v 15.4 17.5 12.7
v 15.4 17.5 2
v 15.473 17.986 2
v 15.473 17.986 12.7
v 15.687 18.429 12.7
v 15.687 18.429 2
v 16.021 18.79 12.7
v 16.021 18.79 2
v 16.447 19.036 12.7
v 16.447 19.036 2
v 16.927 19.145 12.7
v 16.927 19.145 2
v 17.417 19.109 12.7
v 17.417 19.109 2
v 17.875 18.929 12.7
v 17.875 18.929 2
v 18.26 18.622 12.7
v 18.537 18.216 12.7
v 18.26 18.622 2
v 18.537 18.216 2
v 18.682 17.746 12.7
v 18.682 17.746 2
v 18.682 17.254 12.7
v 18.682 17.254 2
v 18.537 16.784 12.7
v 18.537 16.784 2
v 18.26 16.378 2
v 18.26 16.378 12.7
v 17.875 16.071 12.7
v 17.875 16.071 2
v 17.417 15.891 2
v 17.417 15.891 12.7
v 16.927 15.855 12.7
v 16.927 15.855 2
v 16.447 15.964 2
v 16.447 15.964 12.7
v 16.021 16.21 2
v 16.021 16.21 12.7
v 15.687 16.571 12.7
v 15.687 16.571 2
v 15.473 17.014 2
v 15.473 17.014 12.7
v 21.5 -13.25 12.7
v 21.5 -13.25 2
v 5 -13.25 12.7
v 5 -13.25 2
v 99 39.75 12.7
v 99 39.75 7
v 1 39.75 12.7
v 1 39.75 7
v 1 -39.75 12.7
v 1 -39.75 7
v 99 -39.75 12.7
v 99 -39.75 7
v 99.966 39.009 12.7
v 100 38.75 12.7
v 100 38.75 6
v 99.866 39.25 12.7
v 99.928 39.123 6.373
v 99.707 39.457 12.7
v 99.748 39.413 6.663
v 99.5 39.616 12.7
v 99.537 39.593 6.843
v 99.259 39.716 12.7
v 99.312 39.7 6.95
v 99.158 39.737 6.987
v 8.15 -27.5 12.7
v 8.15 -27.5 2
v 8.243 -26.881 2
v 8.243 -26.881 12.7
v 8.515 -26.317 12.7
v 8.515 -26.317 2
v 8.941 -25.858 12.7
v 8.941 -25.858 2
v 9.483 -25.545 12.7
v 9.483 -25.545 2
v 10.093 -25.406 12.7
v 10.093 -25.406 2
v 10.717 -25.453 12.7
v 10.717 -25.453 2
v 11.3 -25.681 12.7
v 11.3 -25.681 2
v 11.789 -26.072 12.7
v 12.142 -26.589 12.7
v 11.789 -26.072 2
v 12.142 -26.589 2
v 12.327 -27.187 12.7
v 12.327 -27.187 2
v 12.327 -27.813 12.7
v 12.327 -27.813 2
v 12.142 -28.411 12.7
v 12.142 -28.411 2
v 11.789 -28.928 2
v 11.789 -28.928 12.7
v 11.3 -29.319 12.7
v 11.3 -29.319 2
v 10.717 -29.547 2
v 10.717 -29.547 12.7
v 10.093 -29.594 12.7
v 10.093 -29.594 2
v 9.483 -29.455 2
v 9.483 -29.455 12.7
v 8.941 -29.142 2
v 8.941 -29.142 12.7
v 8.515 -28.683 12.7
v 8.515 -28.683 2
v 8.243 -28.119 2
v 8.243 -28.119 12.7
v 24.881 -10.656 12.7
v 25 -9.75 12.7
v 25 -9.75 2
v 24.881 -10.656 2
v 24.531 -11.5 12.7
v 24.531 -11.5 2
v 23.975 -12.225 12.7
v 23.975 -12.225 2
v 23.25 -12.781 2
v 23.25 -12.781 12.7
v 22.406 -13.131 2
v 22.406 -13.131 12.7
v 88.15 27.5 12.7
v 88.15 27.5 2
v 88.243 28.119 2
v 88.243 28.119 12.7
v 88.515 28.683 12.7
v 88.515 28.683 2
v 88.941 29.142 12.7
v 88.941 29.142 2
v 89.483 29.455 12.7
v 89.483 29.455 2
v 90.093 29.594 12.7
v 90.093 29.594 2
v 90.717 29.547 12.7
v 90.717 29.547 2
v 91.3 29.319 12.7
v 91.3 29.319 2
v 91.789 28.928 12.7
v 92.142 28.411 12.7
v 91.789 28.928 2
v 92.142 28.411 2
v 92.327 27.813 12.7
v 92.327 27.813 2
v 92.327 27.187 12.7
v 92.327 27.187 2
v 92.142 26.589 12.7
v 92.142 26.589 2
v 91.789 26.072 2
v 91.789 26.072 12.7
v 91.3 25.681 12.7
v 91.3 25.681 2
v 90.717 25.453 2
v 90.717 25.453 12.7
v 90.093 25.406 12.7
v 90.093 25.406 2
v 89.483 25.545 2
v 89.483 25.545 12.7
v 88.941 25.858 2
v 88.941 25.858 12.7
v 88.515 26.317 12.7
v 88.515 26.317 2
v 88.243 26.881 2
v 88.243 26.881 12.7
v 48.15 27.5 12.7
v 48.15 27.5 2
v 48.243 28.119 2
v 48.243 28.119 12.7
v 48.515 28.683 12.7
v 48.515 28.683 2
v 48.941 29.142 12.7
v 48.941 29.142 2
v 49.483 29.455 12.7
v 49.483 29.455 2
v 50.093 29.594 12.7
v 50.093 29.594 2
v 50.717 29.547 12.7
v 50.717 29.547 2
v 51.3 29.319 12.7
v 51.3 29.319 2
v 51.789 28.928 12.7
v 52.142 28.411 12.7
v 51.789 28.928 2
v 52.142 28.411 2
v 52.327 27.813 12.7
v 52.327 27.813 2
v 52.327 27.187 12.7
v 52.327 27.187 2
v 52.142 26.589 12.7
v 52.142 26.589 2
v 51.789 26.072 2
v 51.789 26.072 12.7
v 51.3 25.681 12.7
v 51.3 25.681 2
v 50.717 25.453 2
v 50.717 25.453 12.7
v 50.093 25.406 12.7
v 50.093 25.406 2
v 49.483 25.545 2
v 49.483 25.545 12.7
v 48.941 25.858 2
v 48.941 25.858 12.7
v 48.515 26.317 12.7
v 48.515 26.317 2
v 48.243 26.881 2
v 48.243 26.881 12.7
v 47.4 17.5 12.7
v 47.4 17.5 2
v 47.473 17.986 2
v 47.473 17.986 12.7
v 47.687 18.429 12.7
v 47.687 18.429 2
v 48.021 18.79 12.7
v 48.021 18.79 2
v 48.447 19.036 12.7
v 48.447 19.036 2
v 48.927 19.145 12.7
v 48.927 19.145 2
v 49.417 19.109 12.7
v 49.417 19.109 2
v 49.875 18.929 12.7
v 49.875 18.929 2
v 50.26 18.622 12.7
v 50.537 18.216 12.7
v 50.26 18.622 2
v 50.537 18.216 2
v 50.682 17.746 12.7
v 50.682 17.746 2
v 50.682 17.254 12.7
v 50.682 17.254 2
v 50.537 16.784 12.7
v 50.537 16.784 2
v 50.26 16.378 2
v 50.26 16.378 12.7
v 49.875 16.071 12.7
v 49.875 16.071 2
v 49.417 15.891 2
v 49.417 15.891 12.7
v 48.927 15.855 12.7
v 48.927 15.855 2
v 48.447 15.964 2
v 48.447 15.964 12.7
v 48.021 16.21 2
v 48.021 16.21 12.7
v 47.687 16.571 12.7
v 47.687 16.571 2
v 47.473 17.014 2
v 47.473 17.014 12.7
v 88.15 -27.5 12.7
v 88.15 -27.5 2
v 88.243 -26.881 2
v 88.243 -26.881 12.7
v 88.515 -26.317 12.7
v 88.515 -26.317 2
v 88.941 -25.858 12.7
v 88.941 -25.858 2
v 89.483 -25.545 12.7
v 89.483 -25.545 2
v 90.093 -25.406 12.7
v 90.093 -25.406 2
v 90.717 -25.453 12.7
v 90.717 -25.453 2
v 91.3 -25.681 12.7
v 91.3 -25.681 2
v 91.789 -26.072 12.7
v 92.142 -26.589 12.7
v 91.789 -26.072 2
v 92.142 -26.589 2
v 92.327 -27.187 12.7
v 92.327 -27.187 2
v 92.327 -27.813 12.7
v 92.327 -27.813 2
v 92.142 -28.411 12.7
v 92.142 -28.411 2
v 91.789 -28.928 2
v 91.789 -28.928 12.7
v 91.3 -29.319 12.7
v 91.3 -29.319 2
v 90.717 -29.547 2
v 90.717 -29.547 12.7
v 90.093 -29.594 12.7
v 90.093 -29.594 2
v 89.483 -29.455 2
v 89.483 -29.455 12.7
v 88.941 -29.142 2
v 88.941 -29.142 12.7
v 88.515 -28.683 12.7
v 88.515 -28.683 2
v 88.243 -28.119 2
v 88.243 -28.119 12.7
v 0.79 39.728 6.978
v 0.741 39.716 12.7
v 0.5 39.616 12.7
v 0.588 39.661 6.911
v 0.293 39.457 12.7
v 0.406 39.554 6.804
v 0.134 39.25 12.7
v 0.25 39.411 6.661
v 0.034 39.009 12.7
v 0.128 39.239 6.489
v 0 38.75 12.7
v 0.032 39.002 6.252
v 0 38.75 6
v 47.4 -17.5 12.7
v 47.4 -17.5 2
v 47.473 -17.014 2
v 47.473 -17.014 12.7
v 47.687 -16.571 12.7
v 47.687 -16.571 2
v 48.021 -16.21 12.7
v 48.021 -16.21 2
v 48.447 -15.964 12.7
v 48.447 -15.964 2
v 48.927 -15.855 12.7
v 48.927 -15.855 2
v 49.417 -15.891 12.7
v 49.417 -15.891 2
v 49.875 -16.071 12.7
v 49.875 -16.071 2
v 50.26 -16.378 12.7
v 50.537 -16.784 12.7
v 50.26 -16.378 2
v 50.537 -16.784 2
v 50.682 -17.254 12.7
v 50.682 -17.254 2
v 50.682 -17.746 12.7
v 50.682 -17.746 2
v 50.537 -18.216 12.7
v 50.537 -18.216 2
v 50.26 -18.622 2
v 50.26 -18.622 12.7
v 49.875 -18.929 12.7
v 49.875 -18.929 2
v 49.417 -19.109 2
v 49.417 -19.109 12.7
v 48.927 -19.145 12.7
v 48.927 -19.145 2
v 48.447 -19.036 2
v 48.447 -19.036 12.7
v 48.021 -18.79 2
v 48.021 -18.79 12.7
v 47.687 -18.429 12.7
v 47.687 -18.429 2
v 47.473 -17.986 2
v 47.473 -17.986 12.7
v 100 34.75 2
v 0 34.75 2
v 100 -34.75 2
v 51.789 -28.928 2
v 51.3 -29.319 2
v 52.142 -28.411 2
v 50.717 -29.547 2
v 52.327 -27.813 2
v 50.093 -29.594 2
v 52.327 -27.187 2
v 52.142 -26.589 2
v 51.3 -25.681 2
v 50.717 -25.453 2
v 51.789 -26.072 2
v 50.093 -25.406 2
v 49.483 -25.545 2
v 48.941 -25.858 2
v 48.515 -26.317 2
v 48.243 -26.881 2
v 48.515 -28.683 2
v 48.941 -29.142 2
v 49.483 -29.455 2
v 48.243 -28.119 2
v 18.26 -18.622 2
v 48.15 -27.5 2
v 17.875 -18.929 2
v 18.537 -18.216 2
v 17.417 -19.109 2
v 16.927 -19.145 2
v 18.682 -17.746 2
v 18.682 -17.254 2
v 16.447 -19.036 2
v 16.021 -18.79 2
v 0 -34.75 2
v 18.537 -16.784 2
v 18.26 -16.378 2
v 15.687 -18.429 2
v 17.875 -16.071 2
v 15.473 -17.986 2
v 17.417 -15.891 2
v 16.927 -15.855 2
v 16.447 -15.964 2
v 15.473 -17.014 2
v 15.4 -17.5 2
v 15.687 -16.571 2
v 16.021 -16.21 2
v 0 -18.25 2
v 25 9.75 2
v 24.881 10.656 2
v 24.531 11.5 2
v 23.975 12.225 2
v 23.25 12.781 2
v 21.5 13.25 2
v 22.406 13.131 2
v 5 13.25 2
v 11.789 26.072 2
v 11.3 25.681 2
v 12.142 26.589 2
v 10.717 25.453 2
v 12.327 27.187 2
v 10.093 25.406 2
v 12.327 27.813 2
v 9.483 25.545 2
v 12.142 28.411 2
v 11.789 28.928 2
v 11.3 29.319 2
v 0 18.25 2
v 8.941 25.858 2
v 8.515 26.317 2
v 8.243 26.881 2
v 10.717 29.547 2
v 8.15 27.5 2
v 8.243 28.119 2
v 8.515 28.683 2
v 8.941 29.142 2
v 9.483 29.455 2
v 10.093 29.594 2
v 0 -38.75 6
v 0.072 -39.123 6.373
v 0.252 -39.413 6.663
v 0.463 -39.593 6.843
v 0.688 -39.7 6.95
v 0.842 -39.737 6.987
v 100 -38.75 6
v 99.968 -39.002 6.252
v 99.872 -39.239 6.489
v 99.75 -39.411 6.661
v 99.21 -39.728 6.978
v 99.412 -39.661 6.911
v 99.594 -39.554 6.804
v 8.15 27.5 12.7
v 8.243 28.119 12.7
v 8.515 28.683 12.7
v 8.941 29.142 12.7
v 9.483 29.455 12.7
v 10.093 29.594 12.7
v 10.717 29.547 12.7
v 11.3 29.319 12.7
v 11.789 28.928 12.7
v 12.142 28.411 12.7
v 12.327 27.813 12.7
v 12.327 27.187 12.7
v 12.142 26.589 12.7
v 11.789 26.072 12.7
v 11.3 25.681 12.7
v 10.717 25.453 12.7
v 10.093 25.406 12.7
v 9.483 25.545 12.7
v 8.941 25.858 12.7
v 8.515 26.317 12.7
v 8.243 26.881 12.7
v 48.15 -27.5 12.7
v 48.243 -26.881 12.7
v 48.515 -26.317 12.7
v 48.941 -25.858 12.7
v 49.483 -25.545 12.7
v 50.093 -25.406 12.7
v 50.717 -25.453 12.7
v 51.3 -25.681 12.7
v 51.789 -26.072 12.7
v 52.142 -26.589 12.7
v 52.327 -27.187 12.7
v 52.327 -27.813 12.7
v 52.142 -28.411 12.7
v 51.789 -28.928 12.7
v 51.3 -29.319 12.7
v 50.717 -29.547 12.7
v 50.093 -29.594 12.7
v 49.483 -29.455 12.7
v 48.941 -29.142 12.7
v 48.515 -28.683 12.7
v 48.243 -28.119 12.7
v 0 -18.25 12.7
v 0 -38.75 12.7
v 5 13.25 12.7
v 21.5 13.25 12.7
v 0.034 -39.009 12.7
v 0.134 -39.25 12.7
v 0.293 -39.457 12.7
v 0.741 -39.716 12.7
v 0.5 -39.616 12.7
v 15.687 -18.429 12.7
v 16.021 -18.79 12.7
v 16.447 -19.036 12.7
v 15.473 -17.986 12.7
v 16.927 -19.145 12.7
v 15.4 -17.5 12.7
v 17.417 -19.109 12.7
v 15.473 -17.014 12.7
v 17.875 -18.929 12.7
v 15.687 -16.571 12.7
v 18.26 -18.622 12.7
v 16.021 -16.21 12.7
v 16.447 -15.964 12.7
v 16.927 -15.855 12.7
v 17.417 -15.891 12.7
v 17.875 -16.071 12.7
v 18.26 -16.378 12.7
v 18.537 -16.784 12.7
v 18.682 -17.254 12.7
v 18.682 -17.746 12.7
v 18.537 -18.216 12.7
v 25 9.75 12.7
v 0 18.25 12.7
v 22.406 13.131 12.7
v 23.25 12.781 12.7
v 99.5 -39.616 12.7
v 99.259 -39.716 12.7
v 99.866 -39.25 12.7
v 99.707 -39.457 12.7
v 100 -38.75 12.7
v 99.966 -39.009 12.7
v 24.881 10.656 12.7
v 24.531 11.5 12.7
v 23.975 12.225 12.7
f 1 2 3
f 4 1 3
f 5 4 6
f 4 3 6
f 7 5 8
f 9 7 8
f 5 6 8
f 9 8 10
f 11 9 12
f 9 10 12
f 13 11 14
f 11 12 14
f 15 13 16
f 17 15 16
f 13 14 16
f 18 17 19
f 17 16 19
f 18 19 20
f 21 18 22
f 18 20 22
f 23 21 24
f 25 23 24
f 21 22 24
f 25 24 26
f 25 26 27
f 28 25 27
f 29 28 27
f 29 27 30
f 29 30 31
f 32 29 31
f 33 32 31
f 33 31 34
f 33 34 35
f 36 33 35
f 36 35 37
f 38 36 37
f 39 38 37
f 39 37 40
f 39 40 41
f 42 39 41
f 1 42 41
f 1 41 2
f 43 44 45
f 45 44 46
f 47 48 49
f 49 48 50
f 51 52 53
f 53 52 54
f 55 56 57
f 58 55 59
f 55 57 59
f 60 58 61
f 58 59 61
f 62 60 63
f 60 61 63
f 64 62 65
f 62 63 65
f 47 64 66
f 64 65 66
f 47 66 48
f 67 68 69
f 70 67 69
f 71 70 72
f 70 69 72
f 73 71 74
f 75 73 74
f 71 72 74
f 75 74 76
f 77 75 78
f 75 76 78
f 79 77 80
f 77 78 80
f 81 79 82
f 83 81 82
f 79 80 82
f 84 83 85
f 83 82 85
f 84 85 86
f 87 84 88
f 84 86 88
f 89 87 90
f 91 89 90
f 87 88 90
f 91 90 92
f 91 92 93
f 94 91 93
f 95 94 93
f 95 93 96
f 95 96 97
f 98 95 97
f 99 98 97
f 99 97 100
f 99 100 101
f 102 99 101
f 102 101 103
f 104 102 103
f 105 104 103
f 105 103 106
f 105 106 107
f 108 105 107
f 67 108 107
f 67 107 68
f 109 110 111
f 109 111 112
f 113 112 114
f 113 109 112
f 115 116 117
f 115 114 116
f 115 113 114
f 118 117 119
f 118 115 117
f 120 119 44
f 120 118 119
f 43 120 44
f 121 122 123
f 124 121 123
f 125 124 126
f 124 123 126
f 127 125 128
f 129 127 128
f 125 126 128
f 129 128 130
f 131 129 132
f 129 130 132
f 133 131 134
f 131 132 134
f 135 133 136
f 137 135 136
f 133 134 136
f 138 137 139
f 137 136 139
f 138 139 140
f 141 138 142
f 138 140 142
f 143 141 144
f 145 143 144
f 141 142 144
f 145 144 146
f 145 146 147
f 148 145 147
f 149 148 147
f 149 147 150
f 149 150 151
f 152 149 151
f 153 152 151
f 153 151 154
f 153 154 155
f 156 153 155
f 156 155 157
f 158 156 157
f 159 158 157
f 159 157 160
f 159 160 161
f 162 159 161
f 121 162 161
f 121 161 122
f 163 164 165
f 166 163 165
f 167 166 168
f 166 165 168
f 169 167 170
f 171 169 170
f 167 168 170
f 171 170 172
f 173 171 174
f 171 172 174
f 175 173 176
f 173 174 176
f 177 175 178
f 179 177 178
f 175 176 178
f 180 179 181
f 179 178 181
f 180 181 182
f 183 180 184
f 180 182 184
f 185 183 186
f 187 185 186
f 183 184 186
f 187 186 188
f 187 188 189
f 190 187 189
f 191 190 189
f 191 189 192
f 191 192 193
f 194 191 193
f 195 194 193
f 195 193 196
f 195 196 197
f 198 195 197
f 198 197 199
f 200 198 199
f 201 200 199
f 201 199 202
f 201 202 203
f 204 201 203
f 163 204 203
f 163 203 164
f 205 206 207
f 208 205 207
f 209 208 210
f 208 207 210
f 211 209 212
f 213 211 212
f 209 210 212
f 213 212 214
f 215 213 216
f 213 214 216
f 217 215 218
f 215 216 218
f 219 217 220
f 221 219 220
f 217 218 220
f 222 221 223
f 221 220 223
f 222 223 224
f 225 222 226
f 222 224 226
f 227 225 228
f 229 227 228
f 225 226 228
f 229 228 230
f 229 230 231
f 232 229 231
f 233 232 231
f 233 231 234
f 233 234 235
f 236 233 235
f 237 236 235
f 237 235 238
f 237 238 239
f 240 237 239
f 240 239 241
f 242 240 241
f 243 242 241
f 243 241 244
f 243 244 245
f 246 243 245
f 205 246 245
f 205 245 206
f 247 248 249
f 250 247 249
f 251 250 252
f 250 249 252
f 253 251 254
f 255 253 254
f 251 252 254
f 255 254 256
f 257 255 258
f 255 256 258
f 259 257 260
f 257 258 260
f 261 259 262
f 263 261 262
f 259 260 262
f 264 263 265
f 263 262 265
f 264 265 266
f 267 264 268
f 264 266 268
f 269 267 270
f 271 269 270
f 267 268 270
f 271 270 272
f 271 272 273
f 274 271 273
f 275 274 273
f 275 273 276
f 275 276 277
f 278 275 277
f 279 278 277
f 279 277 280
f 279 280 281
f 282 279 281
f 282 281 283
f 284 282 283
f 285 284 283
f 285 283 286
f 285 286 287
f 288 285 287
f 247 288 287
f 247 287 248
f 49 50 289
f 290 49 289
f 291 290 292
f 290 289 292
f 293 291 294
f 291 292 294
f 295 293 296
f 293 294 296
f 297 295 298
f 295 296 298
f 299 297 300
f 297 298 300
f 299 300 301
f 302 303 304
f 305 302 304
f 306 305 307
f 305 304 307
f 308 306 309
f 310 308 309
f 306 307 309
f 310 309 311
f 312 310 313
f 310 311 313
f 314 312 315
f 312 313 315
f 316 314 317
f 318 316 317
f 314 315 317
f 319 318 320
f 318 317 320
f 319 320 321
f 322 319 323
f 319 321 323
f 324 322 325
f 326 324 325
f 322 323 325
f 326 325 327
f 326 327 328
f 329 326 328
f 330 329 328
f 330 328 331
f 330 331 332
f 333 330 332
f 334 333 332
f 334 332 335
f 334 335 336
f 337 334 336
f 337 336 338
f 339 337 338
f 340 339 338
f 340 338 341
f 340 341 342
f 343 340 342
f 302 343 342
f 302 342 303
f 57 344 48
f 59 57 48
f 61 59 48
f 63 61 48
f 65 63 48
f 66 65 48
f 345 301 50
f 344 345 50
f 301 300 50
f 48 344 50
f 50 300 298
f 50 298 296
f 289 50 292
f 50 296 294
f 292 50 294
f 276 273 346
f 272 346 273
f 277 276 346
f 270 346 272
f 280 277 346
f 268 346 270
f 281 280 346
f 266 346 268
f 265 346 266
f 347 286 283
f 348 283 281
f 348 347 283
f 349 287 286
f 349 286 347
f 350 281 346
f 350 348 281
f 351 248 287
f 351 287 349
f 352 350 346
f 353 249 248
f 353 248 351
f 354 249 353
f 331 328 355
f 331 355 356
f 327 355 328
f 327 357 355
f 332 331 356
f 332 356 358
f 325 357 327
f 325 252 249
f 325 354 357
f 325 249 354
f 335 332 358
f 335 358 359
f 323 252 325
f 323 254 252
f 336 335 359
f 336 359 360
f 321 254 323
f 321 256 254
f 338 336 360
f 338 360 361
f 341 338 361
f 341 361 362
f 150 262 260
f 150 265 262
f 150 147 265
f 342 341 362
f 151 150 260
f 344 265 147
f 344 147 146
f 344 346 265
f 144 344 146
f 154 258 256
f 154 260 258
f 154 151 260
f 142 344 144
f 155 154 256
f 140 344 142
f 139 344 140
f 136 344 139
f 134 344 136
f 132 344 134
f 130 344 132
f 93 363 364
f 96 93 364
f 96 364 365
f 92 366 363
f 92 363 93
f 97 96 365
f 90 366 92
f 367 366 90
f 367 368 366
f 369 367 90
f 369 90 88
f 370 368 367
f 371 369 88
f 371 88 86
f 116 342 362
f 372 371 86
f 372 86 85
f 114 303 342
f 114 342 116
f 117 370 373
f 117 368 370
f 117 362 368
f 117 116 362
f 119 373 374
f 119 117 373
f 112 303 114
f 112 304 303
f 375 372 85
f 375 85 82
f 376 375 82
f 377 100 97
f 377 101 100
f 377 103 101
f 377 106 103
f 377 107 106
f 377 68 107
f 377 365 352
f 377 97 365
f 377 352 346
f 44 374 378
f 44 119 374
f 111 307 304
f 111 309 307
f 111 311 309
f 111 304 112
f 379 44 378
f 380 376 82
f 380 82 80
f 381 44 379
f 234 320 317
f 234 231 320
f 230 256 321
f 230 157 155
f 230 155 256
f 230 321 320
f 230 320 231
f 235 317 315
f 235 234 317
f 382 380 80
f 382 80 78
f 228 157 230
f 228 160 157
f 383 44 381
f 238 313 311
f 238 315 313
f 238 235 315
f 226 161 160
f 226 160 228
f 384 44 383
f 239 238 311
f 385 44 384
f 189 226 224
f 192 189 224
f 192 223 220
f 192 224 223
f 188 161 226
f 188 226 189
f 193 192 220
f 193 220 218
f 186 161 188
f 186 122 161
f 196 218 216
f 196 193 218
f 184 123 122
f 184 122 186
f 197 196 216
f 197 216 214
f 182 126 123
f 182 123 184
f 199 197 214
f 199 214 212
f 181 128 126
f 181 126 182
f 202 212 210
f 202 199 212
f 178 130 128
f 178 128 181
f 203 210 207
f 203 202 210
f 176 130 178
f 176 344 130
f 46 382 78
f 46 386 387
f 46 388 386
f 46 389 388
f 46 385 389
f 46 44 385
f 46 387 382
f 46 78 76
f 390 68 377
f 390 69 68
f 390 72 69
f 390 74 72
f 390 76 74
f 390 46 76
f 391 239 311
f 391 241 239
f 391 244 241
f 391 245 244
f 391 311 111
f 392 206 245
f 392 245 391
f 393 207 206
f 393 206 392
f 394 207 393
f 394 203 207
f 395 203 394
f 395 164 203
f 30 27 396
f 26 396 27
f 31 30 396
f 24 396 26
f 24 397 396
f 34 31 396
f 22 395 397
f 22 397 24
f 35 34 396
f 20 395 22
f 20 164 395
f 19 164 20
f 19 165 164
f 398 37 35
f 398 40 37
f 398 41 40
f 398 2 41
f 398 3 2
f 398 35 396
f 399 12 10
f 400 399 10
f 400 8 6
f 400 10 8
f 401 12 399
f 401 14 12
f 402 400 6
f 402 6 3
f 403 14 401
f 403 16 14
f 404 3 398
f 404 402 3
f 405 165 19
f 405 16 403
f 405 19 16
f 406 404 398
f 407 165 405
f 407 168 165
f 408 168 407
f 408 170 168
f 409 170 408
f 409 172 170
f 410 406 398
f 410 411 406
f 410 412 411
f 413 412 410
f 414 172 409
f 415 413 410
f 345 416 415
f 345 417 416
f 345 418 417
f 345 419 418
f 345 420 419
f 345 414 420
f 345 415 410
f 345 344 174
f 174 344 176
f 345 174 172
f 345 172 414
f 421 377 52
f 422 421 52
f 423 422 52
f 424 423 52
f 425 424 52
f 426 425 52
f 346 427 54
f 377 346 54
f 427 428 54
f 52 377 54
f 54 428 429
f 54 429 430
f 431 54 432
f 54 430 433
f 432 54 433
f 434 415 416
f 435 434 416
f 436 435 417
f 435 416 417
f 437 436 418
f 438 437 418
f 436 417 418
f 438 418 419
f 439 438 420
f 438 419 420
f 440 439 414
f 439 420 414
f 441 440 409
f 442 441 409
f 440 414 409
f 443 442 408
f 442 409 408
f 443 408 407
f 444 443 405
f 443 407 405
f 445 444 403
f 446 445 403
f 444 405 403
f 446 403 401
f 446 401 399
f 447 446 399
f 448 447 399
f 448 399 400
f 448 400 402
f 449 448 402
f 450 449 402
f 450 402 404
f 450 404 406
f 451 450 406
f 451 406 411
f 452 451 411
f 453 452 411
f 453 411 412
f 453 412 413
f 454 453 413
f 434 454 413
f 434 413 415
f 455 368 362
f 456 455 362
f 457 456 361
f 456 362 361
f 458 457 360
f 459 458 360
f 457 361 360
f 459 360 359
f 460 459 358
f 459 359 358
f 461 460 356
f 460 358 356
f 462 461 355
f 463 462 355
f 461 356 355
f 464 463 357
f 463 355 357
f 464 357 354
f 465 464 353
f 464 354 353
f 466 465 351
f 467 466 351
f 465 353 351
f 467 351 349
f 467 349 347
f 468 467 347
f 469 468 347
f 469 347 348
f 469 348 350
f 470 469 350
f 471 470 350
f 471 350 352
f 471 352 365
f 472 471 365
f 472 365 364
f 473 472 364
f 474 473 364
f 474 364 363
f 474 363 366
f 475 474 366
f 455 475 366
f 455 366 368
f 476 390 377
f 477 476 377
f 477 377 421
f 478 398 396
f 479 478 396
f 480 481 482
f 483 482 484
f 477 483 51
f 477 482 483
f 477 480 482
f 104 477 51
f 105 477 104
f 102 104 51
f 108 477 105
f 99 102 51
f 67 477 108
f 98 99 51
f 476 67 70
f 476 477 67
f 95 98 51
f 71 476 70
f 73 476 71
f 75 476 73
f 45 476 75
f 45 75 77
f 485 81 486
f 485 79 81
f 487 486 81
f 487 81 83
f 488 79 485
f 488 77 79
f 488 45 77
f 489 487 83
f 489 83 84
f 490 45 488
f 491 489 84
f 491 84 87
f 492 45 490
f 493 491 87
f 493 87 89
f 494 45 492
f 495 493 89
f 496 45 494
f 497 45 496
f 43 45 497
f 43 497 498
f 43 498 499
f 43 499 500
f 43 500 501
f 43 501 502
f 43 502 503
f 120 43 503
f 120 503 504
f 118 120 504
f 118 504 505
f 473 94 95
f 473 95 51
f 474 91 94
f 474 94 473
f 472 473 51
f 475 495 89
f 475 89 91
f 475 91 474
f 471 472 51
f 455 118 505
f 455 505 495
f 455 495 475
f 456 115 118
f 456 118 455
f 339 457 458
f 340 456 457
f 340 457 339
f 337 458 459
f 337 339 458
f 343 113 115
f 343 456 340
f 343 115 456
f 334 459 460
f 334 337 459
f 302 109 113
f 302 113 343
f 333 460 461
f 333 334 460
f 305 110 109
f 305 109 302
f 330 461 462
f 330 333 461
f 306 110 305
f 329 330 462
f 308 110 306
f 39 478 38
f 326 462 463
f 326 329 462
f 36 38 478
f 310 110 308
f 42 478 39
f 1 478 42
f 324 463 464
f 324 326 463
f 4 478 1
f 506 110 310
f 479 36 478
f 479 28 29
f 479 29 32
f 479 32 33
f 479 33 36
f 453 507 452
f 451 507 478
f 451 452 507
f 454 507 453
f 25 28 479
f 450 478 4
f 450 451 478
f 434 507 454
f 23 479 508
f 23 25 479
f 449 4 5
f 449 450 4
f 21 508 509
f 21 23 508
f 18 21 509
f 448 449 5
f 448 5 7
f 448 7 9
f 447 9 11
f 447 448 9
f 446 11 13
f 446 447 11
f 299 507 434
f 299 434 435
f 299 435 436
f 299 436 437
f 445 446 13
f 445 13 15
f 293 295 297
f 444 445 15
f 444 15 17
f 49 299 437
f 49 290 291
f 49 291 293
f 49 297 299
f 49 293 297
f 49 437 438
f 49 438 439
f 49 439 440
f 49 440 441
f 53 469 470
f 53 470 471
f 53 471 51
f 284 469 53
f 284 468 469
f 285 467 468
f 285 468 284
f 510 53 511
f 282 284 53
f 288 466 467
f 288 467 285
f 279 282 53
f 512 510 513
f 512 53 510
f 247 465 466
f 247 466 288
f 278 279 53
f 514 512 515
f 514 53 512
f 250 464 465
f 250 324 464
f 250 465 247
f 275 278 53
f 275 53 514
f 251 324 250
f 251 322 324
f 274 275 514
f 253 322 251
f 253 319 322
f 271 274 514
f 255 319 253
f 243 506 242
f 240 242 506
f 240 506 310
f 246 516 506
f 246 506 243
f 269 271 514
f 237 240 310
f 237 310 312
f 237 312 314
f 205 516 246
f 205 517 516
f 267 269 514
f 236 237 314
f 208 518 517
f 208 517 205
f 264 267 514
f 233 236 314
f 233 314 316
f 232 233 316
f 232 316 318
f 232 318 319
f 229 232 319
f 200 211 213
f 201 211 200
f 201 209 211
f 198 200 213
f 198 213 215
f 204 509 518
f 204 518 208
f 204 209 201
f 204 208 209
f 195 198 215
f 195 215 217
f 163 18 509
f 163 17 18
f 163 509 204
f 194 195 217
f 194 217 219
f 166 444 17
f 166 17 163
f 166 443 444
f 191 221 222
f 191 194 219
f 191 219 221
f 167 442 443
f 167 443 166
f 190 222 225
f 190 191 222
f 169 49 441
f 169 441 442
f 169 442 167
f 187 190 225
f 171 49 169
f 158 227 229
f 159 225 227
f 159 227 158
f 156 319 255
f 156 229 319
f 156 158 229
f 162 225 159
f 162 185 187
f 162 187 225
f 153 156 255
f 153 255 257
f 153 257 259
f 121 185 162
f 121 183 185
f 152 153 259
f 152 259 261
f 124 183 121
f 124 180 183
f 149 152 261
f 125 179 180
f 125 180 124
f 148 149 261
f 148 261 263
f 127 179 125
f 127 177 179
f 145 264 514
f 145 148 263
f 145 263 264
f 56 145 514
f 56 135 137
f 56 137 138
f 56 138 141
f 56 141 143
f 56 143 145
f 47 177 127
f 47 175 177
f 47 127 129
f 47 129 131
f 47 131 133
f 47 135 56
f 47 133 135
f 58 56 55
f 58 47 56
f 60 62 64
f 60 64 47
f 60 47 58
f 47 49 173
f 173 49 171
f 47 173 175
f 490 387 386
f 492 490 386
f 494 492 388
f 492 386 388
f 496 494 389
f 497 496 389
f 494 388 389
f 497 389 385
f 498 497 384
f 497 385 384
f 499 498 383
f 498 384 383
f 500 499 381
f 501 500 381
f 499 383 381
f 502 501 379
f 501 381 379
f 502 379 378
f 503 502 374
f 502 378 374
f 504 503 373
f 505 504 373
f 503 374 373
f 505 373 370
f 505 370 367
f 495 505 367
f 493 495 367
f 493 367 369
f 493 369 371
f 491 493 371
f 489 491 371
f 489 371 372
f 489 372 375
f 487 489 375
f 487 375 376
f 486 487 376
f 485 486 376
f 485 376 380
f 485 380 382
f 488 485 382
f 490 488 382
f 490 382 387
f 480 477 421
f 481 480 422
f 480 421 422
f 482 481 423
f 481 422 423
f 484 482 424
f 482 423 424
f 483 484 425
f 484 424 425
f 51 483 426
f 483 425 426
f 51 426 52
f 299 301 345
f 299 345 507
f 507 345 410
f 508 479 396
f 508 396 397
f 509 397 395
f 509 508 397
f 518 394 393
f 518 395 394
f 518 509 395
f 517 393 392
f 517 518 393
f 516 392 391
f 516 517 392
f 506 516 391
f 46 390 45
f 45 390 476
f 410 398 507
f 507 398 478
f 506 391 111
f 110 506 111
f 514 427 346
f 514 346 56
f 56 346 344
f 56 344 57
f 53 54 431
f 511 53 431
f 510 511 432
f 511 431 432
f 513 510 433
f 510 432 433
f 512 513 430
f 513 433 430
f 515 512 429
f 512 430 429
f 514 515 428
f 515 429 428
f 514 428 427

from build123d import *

# Parameters (mm, degrees)
BOSS_EXTRUDE1_DEPTH         = 12.7
CHAMFER1_SIZE               = 5
FILLET1_R                   = 3.5
TAP_DRILL_FOR_M5X0_8_TAP1_D = 4.2
CUT_EXTRUDE1_DEPTH          = 2
CHAMFER3_SIZE               = 5
TAP_DRILL_FOR_M4X0_7_TAP1_D = 3.3
CUT_EXTRUDE2_DEPTH          = 2


with BuildPart() as part:
    # Sketch1 → Boss-Extrude1 (new body)
    with BuildSketch(Plane.XY):
        with BuildLine():
            Line((0, 38.75), (0, 13.25))
            Line((0, 13.25), (25, 13.25))
            Line((25, 13.25), (25, -13.25))
            Line((25, -13.25), (0, -13.25))
            Line((0, -13.25), (0, -38.75))
            ThreePointArc((0, -38.75), (0.292893219, -39.457106781), (1, -39.75))
            Line((1, -39.75), (99, -39.75))
            ThreePointArc((99, -39.75), (99.707106781, -39.457106781), (100, -38.75))
            Line((100, -38.75), (100, 38.75))
            ThreePointArc((100, 38.75), (99.707106781, 39.457106781), (99, 39.75))
            Line((99, 39.75), (1, 39.75))
            ThreePointArc((1, 39.75), (0.292893219, 39.457106781), (0, 38.75))
        make_face()
    extrude(amount=BOSS_EXTRUDE1_DEPTH)

    # Chamfer1
    chamfer1_edges = [part.edges().sort_by_distance(p)[0] for p in [
        (0, 13.25, 6.35),
        (0, -13.25, 6.35),
    ]]
    chamfer(chamfer1_edges, length=CHAMFER1_SIZE)

    # Fillet1
    fillet1_edges = [part.edges().sort_by_distance(p)[0] for p in [
        (25, -13.25, 6.35),
        (25, 13.25, 6.35),
    ]]
    fillet(fillet1_edges, radius=FILLET1_R)

    # Tap Drill for M5x0.8 Tap1 (through all)
    with Locations(Plane.XY.offset(12.7)):
        with Locations((10.25, 27.5), (50.25, 27.5), (90.25, 27.5), (90.25, -27.5), (50.25, -27.5), (10.25, -27.5)):
            Hole(TAP_DRILL_FOR_M5X0_8_TAP1_D / 2)

    # Sketch8 → Cut-Extrude1 (cut)
    with BuildSketch(Plane(origin=(0, 0, 0), x_dir=(-1, 0, 0), z_dir=(0, 0, -1))):
        with BuildLine():
            Line((-21.5, 13.25), (-5, 13.25))
            Line((-5, 13.25), (0, 18.25))
            Line((0, 18.25), (0, 38.75))
            ThreePointArc((0, 38.75), (-0.292893219, 39.457106781), (-1, 39.75))
            Line((-1, 39.75), (-99, 39.75))
            ThreePointArc((-99, 39.75), (-99.707106781, 39.457106781), (-100, 38.75))
            Line((-100, 38.75), (-100, -38.75))
            ThreePointArc((-100, -38.75), (-99.707106781, -39.457106781), (-99, -39.75))
            Line((-99, -39.75), (-1, -39.75))
            ThreePointArc((-1, -39.75), (-0.292893219, -39.457106781), (0, -38.75))
            Line((0, -38.75), (0, -18.25))
            Line((0, -18.25), (-5, -13.25))
            Line((-5, -13.25), (-21.5, -13.25))
            ThreePointArc((-21.5, -13.25), (-23.974873734, -12.224873734), (-25, -9.75))
            Line((-25, -9.75), (-25, 9.75))
            ThreePointArc((-25, 9.75), (-23.974873734, 12.224873734), (-21.5, 13.25))
        make_face()
        with BuildLine():
            Line((-84, -12.5), (-41, -12.5))
            ThreePointArc((-41, -12.5), (-38.525126266, -11.474873734), (-37.5, -9))
            Line((-37.5, -9), (-37.5, 9))
            ThreePointArc((-37.5, 9), (-38.525126266, 11.474873734), (-41, 12.5))
            Line((-41, 12.5), (-84, 12.5))
            ThreePointArc((-84, 12.5), (-86.474873734, 11.474873734), (-87.5, 9))
            Line((-87.5, 9), (-87.5, -9))
            ThreePointArc((-87.5, -9), (-86.474873734, -11.474873734), (-84, -12.5))
        make_face(mode=Mode.SUBTRACT)
    extrude(amount=-CUT_EXTRUDE1_DEPTH, mode=Mode.SUBTRACT)

    # Chamfer3
    # the kernel refuses this chamfer: 5 mm, written as the material it takes off along each edge
    with BuildSketch(Plane(origin=(111.85841494, -39.75, 2), x_dir=(0, 0.9996219169112968, -0.02749587661058636), z_dir=(-1, 0, 0)), Plane(origin=(-11.85841494, 39.75, 2), x_dir=(0, -0.9996219169112968, -0.02749587661058636), z_dir=(1, 0, 0))) as chamfer3_piece_1:
        Polygon((CHAMFER3_SIZE * 0.999621916911, -CHAMFER3_SIZE * 0.0274958766106), (-CHAMFER3_SIZE * 0.0274958766106, -CHAMFER3_SIZE * 0.999621916911), (0, 0), align=None)
    extrude(amount=123.71682988, mode=Mode.SUBTRACT)

    # Tap Drill for M4x0.7 Tap1 (through all)
    with Locations(Plane.XY.offset(12.7)):
        with Locations((17.05, 17.5), (17.05, -17.5), (49.05, -17.5), (49.05, 17.5)):
            Hole(TAP_DRILL_FOR_M4X0_7_TAP1_D / 2)

    # Sketch11 → Cut-Extrude2 (cut)
    with BuildSketch(Plane(origin=(0, 0, 0), x_dir=(-1, 0, 0), z_dir=(0, 0, -1))):
        with BuildLine():
            Line((-37.5, -9), (-37.5, 9))
            ThreePointArc((-37.5, 9), (-38.525126266, 11.474873734), (-41, 12.5))
            Line((-41, 12.5), (-84, 12.5))
            ThreePointArc((-84, 12.5), (-86.474873734, 11.474873734), (-87.5, 9))
            Line((-87.5, 9), (-87.5, -9))
            ThreePointArc((-87.5, -9), (-86.474873734, -11.474873734), (-84, -12.5))
            Line((-84, -12.5), (-41, -12.5))
            ThreePointArc((-41, -12.5), (-38.525126266, -11.474873734), (-37.5, -9))
        make_face()
    extrude(amount=-CUT_EXTRUDE2_DEPTH, mode=Mode.SUBTRACT)


solid = part.part
